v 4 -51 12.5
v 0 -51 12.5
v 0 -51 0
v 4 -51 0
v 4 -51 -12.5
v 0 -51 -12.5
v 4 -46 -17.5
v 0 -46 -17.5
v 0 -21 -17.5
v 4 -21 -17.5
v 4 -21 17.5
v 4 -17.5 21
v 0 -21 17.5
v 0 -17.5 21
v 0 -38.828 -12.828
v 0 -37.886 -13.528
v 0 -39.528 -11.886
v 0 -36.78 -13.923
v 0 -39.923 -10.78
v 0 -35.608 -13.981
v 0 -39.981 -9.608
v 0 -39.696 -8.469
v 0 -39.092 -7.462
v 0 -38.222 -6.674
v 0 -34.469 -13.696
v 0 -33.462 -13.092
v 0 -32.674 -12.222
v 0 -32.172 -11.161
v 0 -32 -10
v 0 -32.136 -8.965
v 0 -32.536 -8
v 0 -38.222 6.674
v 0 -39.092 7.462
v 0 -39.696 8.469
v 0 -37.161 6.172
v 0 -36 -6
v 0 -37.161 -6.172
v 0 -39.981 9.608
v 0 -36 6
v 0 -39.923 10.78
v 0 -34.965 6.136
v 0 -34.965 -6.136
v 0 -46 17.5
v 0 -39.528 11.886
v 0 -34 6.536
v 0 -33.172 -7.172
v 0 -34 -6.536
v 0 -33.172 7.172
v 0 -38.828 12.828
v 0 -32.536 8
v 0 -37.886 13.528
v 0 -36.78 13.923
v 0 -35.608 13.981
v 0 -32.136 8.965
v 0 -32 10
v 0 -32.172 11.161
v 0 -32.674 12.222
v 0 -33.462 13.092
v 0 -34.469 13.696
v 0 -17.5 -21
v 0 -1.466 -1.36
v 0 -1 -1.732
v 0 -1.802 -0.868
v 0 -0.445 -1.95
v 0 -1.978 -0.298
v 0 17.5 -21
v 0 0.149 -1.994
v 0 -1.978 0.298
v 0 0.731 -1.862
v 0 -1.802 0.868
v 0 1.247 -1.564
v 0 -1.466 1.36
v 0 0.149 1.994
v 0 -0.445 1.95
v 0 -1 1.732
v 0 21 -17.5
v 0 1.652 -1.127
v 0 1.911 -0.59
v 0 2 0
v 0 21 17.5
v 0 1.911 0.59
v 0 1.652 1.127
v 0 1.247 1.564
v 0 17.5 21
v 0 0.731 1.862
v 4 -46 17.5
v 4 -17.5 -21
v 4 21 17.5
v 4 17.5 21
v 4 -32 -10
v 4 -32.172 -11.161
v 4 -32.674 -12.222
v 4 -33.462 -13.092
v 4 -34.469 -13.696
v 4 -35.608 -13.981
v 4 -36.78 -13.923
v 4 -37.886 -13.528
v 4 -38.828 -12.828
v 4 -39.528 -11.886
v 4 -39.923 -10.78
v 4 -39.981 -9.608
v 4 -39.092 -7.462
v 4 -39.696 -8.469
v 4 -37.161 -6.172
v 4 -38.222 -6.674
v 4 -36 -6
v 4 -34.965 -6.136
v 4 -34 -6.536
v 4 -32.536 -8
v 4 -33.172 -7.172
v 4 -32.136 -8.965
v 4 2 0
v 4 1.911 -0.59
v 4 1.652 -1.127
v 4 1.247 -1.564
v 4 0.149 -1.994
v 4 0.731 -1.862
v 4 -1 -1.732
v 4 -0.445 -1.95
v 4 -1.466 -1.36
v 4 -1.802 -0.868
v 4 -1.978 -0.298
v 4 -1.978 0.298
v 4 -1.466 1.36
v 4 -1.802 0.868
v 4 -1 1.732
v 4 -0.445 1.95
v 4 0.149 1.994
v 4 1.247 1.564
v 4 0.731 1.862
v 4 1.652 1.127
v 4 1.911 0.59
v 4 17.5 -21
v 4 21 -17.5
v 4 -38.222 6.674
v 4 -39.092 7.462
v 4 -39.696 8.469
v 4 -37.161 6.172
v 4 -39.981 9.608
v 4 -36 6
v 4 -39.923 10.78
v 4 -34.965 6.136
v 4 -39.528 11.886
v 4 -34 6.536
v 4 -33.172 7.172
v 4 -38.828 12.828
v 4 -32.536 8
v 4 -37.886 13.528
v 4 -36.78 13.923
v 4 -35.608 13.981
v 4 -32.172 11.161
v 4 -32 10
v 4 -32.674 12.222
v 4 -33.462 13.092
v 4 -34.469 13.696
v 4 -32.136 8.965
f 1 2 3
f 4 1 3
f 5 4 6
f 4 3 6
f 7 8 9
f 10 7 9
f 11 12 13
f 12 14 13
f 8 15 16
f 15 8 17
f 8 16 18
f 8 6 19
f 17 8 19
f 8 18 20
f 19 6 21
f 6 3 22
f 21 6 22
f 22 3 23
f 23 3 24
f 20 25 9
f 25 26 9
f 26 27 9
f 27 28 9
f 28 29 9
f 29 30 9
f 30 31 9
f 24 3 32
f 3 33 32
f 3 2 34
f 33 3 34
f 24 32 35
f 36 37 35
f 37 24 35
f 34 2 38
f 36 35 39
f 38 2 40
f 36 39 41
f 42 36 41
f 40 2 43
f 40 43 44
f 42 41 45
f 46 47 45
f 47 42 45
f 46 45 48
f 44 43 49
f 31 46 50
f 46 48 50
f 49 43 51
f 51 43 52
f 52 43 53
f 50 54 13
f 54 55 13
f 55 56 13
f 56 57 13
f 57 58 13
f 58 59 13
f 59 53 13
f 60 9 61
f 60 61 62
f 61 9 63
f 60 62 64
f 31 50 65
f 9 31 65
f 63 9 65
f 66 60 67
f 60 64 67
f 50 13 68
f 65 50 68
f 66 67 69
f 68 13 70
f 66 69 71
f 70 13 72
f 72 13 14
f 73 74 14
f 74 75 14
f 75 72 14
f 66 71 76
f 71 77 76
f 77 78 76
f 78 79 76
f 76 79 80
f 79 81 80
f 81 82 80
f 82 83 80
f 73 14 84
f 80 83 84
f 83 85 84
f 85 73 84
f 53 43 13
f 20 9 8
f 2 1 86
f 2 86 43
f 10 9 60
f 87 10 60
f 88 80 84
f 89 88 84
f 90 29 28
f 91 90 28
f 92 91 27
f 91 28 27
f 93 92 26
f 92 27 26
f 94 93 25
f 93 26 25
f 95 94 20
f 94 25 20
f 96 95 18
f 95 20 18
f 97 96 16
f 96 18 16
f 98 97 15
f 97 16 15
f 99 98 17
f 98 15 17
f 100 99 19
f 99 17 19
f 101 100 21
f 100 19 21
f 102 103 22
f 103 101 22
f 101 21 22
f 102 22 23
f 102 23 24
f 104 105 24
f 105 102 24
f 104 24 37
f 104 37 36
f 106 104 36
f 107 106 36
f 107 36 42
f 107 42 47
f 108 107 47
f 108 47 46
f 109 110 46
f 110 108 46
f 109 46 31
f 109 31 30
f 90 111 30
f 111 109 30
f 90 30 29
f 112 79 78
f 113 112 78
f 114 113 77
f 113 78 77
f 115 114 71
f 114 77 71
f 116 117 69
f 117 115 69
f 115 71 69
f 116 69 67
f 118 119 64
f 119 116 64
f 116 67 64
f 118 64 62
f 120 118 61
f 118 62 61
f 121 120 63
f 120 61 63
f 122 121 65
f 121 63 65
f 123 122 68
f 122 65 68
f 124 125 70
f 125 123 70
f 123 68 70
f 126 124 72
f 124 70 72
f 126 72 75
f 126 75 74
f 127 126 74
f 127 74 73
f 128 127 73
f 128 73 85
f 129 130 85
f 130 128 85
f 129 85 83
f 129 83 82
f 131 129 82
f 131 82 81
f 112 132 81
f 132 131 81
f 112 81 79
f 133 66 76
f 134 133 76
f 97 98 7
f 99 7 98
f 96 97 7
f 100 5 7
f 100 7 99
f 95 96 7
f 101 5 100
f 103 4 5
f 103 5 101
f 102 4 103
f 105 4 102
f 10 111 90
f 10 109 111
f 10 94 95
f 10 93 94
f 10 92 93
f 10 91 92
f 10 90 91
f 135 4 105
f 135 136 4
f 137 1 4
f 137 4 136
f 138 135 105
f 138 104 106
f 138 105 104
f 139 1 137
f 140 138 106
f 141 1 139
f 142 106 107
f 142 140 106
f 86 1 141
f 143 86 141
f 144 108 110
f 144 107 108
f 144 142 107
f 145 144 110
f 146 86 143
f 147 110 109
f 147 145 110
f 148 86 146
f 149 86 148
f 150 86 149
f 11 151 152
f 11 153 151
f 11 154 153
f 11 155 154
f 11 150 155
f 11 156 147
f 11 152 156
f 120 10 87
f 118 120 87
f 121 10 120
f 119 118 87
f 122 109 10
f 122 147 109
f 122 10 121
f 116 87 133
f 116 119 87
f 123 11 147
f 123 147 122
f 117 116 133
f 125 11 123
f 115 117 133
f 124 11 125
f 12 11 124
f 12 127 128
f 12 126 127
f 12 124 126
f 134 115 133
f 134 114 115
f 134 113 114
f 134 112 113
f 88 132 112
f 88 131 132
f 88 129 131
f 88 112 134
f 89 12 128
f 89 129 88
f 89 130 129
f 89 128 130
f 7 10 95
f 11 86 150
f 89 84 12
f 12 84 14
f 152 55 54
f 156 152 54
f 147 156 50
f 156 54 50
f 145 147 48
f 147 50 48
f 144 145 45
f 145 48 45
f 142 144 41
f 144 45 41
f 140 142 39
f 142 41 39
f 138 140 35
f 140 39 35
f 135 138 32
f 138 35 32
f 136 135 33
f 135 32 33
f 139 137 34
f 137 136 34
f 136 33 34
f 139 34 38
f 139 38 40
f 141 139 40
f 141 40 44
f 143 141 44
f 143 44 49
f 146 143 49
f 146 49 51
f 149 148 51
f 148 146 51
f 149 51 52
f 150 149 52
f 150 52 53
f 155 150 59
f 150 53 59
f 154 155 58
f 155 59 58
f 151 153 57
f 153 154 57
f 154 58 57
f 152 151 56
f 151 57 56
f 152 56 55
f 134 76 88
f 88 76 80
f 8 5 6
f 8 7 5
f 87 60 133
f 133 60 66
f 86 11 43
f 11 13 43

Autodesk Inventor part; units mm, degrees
ref_plane "YZ Plane" through (0, 0, 0) normal (1, 0, 0) x (0, 1, 0)
ref_plane "XZ Plane" through (0, 0, 0) normal (0, 1, 0) x (-1, 0, 0)
ref_plane "XY Plane" through (0, 0, 0) normal (0, 0, 1) x (1, 0, 0)
sketch "Эскиз1" plane through (0, 0, 0) normal (1, 0, 0) x (0, 1, 0)
  line L0 (-17.5, 21) -> (-21, 17.5)
  line L1 (-21, 17.5) -> (-21, -17.5)
  line L2 (-21, -17.5) -> (-17.5, -21)
  line L3 (-17.5, -21) -> (17.5, -21)
  line L4 (17.5, -21) -> (21, -17.5)
  line L5 (21, -17.5) -> (21, 17.5)
  line L6 (21, 17.5) -> (17.5, 21)
  line L7 (17.5, 21) -> (-17.5, 21)
  circle A0 centre (0, 0) radius 11.3
  line L8 (-21, 17.5) -> (-51, 17.5)
  line L9 (-51, 17.5) -> (-51, -17.5)
  line L10 (-51, -17.5) -> (-21, -17.5)
  line L11 (-21, -17.5) -> (-21, 17.5)
  line L12 (-51, 0) -> (-36, 0)
  line L13 (-36, 0) -> (-36, 10)
  line L14 (-36, 10) -> (-36, -10)
  circle A1 centre (-36, 10) radius 4
  circle A2 centre (-36, -10) radius 4
  circle A3 centre (0, 0) radius 2
  dimension "d0" = 30
  dimension "d1" = 15
  dimension "d2" = 10
  dimension "d3" = 20
  dimension "d4" = 8
  dimension "d5" = 8
  dimension "d6" = 4
extrude "Выдавливание1" add sketch "Эскиз1" along normal blind 4 contours L7 L6 L5 L4 L3 L2 L1 L0 | L1 L10 L9 L8 | A0
chamfer "Фаска1" distance 5 angle 45 2 edges at (2, -51, 17.5) (2, -51, -17.5)
properties part number "КВ33.044.002 - Держатель катка" material "Пластик АБС"
